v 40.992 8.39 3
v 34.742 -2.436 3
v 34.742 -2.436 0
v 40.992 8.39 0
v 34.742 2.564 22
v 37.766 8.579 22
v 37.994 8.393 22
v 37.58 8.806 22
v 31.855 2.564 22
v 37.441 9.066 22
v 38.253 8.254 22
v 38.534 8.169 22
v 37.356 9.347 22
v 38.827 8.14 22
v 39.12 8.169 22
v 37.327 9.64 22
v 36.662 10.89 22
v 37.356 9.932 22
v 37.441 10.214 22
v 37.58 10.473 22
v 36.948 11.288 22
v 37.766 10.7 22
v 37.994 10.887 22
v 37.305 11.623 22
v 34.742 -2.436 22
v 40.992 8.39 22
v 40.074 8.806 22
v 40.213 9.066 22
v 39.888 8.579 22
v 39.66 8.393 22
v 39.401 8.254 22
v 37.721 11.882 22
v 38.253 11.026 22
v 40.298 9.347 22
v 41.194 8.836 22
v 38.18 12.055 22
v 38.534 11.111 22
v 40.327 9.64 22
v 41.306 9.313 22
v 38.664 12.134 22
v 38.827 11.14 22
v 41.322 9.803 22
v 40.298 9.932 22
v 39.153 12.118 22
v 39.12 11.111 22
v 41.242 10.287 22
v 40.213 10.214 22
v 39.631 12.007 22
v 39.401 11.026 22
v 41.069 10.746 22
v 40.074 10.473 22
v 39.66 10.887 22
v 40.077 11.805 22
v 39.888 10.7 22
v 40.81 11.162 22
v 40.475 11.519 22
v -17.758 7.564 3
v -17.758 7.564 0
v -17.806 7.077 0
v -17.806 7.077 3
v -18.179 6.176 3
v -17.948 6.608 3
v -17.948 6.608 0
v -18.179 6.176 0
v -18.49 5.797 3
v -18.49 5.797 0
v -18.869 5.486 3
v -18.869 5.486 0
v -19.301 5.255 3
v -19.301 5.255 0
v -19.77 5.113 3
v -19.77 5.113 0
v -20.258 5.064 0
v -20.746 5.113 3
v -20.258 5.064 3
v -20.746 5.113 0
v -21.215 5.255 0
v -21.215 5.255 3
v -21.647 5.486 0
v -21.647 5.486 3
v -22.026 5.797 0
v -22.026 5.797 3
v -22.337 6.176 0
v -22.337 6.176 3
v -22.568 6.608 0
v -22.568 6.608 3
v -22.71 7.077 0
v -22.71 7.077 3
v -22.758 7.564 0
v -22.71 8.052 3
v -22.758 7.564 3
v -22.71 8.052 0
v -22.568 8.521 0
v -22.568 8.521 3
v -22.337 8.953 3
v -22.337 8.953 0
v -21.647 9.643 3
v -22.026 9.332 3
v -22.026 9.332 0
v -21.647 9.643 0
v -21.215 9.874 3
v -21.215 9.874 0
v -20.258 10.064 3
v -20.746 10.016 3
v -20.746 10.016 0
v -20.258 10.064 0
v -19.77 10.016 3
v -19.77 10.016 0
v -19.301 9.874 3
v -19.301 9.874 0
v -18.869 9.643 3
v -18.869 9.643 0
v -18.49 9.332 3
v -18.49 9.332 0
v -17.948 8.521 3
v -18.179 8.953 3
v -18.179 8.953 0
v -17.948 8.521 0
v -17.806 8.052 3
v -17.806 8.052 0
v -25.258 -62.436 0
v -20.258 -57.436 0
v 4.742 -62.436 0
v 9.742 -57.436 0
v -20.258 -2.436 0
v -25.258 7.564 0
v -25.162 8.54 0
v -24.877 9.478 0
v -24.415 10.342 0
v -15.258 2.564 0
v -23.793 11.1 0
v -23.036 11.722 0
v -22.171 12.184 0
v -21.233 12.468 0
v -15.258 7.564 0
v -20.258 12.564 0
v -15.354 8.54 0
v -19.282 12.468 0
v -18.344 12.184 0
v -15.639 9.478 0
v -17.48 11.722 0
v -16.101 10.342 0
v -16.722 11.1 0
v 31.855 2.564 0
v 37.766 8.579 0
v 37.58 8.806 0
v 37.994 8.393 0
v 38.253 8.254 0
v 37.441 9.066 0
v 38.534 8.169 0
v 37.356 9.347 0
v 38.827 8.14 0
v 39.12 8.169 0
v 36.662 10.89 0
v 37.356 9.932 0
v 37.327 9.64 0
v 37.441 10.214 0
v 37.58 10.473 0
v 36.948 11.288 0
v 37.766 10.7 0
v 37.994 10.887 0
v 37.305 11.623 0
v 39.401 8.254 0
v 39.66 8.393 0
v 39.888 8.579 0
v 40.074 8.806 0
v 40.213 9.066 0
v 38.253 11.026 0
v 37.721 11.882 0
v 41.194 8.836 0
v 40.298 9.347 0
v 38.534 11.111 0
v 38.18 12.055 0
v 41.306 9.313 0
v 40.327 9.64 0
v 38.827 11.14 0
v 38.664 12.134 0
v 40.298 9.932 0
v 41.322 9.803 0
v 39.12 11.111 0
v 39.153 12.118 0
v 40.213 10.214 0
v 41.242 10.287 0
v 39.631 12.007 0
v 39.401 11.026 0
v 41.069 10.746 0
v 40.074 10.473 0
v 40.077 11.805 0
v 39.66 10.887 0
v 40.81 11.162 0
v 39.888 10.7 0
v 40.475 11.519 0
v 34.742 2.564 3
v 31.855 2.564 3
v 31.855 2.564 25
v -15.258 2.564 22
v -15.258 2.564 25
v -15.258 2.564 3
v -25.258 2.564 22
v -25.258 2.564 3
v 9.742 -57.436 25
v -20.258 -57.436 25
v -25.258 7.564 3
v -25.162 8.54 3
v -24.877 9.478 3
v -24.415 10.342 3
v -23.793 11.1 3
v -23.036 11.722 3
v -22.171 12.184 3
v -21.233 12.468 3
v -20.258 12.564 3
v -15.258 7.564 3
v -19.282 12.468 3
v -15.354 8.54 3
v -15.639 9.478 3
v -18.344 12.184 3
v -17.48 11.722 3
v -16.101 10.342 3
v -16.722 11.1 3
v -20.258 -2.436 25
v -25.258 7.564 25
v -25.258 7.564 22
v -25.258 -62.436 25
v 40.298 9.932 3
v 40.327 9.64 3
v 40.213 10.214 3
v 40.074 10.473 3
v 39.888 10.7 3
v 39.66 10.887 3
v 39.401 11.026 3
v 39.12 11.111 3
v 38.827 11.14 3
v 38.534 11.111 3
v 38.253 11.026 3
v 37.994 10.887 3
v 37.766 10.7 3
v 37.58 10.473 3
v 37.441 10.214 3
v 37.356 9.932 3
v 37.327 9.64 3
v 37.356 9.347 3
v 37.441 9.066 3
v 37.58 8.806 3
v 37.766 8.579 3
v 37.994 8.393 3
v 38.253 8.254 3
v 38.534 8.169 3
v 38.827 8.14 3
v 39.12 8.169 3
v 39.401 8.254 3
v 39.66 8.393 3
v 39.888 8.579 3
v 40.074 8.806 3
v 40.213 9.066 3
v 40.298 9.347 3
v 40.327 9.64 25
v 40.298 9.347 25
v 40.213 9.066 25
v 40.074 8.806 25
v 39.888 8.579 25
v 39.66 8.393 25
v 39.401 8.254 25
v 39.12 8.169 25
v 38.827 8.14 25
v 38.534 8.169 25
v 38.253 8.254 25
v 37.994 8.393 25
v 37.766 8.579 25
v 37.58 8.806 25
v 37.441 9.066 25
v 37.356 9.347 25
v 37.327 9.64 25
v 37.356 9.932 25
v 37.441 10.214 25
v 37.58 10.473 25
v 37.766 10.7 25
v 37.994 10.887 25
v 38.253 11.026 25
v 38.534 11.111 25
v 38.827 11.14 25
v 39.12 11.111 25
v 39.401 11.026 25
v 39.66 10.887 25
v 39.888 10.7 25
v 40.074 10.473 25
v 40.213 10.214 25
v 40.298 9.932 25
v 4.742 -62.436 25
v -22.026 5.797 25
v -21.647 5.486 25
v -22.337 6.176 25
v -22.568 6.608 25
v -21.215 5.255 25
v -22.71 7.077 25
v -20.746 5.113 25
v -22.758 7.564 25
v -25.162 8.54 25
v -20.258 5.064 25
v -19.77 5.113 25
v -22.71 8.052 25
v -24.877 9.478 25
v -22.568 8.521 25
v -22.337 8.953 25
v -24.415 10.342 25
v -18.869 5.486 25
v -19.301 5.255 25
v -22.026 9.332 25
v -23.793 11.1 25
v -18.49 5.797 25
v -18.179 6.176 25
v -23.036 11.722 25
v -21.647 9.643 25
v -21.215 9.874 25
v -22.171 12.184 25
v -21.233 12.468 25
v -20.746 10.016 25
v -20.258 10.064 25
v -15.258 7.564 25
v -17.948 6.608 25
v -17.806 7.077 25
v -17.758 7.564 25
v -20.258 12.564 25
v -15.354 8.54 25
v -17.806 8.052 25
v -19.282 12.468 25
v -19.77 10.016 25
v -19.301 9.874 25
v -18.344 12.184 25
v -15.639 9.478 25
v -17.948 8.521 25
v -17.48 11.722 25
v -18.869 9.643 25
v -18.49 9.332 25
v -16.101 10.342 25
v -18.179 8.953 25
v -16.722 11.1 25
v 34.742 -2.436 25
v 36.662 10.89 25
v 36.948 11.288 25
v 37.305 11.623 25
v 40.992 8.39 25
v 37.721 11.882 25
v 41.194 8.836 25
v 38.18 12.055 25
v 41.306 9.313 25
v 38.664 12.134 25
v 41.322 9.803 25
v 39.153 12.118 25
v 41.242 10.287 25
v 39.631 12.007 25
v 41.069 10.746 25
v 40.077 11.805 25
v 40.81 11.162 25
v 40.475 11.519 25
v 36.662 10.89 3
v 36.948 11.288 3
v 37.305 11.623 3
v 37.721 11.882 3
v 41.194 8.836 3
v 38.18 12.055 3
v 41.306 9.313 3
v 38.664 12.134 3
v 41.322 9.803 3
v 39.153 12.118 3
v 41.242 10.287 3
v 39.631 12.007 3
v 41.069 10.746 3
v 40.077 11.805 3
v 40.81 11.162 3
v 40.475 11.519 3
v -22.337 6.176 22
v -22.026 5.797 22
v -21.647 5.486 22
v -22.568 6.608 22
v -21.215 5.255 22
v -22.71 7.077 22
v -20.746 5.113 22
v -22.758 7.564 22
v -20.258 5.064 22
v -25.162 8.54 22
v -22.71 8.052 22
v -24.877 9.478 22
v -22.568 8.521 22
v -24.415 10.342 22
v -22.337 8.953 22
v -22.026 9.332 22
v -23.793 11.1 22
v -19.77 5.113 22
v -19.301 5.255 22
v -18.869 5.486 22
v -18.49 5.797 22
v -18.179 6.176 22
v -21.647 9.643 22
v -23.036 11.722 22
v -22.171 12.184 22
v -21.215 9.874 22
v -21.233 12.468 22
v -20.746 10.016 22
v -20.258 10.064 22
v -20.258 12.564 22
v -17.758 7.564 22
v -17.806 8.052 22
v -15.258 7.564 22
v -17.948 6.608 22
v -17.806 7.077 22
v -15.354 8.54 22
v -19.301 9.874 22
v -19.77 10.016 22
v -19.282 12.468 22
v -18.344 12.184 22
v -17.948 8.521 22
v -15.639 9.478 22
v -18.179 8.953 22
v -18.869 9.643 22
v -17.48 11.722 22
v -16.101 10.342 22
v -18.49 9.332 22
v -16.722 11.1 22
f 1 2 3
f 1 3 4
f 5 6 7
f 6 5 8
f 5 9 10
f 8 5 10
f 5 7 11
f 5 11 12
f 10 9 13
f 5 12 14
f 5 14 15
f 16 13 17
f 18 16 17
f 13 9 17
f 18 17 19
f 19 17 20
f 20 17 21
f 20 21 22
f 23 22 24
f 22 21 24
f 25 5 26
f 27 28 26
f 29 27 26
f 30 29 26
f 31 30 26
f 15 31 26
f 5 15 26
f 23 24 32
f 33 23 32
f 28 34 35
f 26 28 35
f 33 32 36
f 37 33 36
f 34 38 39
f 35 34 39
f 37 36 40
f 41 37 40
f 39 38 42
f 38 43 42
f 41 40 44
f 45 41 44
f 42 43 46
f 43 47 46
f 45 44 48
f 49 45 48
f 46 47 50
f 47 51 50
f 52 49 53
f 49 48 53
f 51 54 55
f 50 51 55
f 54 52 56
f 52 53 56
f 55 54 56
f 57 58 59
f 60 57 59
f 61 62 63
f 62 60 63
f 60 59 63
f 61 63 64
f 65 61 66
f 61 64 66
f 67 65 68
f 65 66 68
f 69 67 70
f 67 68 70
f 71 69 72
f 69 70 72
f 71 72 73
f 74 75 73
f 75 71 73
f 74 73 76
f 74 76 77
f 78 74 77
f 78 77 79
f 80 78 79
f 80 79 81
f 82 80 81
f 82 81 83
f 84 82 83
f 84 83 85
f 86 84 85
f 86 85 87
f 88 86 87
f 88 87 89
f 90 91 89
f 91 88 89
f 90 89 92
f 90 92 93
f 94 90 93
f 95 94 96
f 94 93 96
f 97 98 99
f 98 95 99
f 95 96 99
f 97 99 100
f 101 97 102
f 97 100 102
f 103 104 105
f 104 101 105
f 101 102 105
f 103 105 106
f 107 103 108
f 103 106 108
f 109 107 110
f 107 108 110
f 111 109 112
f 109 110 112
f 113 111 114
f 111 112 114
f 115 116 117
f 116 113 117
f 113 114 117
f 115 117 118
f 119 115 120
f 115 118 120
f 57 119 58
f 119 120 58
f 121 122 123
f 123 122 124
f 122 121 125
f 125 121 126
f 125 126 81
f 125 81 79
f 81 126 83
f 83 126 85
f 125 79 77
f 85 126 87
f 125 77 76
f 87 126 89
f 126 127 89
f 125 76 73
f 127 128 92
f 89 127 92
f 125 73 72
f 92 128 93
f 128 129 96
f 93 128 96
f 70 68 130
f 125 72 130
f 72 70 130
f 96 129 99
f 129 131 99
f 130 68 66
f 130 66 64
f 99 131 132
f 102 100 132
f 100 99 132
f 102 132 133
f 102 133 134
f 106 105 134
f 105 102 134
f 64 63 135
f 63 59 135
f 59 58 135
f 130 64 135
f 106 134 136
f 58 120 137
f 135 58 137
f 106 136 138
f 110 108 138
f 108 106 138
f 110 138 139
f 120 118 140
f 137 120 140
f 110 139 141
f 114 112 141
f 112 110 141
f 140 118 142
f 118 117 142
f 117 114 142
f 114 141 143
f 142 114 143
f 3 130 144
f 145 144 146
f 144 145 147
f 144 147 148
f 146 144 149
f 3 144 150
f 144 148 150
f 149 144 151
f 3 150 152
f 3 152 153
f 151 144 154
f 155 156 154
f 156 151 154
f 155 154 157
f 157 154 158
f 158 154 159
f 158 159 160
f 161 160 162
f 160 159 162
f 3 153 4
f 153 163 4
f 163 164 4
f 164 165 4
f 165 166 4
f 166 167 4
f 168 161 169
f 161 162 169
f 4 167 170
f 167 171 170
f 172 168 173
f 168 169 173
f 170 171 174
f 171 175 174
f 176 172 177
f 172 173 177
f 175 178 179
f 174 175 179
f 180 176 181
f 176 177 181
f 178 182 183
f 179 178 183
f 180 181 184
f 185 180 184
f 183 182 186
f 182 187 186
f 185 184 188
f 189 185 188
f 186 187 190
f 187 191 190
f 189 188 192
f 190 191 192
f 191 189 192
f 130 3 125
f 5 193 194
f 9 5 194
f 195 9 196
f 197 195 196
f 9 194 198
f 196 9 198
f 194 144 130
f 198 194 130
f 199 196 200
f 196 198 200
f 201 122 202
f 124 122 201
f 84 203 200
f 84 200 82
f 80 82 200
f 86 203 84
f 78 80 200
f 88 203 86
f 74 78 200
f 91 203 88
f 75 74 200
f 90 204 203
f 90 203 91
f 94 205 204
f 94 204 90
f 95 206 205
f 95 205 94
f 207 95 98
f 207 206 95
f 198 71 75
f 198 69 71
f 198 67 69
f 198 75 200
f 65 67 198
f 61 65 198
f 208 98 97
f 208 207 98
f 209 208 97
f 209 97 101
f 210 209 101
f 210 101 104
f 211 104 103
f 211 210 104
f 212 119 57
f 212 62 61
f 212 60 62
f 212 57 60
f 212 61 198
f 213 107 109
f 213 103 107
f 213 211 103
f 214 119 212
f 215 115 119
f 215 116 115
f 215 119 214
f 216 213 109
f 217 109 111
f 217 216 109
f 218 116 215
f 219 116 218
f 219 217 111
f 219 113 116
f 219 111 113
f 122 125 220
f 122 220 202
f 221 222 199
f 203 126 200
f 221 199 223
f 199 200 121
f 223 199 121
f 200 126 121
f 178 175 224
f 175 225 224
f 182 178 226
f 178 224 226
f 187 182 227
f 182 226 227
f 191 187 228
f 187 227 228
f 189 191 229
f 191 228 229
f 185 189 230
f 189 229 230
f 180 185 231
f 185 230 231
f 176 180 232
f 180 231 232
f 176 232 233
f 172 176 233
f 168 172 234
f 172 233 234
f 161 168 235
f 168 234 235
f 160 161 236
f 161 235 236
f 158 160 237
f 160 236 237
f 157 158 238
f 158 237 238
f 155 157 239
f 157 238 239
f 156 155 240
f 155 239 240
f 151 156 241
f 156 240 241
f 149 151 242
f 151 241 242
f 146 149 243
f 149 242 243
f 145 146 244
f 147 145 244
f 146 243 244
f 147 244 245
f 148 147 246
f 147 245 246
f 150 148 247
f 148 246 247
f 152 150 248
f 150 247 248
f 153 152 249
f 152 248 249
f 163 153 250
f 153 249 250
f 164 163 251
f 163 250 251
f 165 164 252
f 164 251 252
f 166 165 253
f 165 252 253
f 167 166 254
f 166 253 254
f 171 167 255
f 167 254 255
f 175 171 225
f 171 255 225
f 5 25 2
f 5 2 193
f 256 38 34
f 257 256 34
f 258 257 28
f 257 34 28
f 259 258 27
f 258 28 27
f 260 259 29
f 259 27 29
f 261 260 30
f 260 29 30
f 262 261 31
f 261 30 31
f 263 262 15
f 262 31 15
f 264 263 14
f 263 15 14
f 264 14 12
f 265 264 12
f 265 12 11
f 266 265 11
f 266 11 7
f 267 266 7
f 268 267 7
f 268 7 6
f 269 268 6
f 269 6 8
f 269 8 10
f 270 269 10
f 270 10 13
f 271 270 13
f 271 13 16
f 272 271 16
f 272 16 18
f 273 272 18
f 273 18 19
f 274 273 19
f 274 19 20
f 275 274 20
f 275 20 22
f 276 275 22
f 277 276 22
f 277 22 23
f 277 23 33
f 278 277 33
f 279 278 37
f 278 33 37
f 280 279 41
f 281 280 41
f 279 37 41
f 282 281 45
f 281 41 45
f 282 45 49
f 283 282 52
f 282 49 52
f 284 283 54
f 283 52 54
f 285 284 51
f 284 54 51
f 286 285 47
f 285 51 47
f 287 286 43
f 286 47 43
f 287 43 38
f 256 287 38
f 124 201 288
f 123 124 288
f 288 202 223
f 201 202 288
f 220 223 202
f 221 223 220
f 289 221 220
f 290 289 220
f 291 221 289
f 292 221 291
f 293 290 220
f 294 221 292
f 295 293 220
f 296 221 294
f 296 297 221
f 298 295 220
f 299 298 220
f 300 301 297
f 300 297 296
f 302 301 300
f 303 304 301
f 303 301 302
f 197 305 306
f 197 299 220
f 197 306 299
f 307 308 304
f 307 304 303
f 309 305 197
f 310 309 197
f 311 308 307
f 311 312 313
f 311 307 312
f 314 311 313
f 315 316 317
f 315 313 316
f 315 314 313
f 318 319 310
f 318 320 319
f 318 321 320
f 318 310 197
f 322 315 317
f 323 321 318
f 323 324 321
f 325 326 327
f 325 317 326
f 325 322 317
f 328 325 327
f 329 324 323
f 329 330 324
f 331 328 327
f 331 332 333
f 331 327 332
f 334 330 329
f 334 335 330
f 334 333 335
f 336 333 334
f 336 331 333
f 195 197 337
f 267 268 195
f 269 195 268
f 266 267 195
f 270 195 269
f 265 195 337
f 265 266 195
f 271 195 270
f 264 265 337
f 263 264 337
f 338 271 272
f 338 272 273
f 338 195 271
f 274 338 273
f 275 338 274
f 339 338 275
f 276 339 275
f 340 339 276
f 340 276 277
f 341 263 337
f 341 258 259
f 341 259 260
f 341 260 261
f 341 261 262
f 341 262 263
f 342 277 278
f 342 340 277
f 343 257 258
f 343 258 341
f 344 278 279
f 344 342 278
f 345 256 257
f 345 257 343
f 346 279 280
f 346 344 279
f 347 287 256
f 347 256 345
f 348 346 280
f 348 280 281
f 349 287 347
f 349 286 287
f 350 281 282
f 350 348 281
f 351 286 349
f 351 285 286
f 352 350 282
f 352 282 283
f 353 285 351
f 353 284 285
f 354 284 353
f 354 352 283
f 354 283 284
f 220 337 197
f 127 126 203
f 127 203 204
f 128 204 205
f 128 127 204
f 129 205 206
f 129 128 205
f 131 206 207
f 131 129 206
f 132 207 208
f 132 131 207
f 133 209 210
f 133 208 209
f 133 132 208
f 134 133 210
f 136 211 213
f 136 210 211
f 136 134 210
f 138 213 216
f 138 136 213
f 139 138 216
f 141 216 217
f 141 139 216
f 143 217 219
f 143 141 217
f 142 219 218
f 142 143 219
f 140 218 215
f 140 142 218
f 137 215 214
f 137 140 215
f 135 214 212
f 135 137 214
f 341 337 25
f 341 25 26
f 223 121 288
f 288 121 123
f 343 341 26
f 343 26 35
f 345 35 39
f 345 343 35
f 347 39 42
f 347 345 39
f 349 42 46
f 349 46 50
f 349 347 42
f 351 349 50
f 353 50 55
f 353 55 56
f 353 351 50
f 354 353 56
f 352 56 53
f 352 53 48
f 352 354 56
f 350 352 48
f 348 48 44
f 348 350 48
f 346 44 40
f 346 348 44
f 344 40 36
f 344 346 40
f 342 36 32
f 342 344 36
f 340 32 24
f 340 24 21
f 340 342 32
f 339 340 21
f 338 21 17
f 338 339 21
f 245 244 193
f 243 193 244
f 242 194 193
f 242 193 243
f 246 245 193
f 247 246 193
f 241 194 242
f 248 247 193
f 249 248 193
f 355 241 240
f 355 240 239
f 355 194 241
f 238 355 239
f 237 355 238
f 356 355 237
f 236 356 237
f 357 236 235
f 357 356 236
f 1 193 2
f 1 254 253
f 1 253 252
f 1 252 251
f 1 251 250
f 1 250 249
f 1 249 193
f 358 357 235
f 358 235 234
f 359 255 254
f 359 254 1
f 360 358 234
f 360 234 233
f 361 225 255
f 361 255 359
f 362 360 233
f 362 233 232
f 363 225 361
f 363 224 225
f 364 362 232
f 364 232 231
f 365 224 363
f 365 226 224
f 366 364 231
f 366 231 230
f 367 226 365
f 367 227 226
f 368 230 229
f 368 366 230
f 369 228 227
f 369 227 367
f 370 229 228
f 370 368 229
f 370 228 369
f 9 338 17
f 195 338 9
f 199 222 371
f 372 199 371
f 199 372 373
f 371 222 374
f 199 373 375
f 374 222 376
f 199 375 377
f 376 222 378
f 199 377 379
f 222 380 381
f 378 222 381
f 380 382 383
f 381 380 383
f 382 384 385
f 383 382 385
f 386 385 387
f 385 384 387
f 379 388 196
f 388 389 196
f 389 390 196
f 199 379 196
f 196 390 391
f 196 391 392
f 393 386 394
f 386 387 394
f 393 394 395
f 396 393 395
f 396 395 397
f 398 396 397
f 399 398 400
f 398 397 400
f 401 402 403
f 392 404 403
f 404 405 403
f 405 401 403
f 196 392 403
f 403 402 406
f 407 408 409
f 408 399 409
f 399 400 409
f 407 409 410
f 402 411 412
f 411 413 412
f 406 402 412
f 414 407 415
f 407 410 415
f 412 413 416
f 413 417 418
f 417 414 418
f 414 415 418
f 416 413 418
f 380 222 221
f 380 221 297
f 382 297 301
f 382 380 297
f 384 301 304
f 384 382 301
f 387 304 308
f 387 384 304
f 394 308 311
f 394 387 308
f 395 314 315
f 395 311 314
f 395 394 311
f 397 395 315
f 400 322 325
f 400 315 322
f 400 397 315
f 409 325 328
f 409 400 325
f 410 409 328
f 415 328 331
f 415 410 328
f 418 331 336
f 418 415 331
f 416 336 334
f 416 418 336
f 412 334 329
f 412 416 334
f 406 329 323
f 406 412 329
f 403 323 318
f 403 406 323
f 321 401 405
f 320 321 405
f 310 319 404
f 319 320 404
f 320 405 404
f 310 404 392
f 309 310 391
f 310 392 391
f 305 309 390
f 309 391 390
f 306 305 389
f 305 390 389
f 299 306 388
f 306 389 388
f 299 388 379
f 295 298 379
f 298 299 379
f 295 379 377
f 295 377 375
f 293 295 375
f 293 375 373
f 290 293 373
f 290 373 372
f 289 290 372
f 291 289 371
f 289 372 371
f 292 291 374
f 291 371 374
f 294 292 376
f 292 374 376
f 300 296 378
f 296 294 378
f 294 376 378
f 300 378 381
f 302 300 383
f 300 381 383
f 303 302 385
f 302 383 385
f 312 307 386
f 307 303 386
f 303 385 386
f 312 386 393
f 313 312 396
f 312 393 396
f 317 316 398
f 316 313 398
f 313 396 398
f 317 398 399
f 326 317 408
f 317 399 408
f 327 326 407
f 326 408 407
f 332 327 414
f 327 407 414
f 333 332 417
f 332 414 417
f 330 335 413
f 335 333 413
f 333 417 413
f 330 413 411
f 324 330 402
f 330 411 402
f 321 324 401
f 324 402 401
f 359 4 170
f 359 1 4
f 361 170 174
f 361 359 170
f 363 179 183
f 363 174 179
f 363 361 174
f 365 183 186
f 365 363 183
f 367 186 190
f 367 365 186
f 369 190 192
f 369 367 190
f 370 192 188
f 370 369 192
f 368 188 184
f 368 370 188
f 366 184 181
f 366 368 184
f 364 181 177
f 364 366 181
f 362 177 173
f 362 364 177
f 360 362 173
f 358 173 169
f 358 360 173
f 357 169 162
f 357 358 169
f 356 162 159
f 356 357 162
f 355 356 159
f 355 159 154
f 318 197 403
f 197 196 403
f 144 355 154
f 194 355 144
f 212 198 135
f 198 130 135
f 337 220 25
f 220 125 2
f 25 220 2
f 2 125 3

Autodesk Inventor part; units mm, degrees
ref_plane "YZ Plane" through (0, 0, 0) normal (1, 0, 0) x (0, 1, 0)
ref_plane "XZ Plane" through (0, 0, 0) normal (0, 1, 0) x (-1, 0, 0)
ref_plane "XY Plane" through (0, 0, 0) normal (0, 0, 1) x (1, 0, 0)
sketch "Sketch1" plane through (0, 0, 0) normal (0, 0, 1) x (1, 0, 0)
  circle A0 centre (-20.2579, 7.5645) radius 2.5
  line L0 (34.7421, -2.4355) -> (34.7421, 2.5645)
  line L1 (34.7421, 2.5645) -> (-15.2579, 2.5645)
  line L2 (-15.2579, 2.5645) -> (-15.2579, 7.5645)
  arc A1 (-15.2579, 7.5645) -> (-25.2579, 7.5645) centre (-20.2579, 7.5645) ccw
  line L3 (-25.2579, 7.5645) -> (-25.2579, -62.4355)
  line L4 (-25.2579, -62.4355) -> (4.7421, -62.4355)
  line L5 (9.7421, -57.4355) -> (4.7421, -62.4355)
  line L6 (-20.2579, -57.4355) -> (9.7421, -57.4355)
  line L7 (-20.2579, -2.4355) -> (-20.2579, -57.4355)
  line L8 (-20.2579, -2.4355) -> (34.7421, -2.4355)
  line L9 (-15.2579, 2.5645) -> (-25.2579, 2.5645)
  point P0 (0, 0)
  point P1 (4.7421, 37.5645)
  dimension "d0" = 5
  dimension "d1" = 5
  dimension "d2" = 30
  dimension "d3" = 55
  dimension "d4" = 5
  dimension "d5" = 5
  dimension "d6" = 5
  dimension "d7" = 65
  dimension "d8" = 5
  dimension "d24" = 30
extrude "Extrusion1" add sketch "Sketch1" along normal blind 25
ref_plane "Work Plane1" through (0, 0, 12.5) normal (0, 0, 1) x (1, 0, 0)
sketch "Sketch2" plane through (0, 0, 12.5) normal (0, 0, 1) x (1, 0, 0)
  line L0 (-15.2579, 2.5645) -> (-15.2579, 7.5645) projected
  line L1 (34.7421, 2.5645) -> (-15.2579, 2.5645) projected
  line L2 (34.7421, -2.4355) -> (34.7421, 2.5645) projected
  line L3 (-20.2579, -2.4355) -> (34.7421, -2.4355) projected
  line L4 (-20.2579, -57.4355) -> (-20.2579, -2.4355) projected
  line L5 (9.7421, -57.4355) -> (-20.2579, -57.4355) projected
  line L6 (4.7421, -62.4355) -> (9.7421, -57.4355) projected
  line L7 (-25.2579, -62.4355) -> (4.7421, -62.4355) projected
  line L8 (-25.2579, 7.5645) -> (-25.2579, -62.4355) projected
  arc A0 (-15.2579, 7.5645) -> (-25.2579, 7.5645) centre (-20.2579, 7.5645) ccw projected
  circle A1 centre (-20.2579, 7.5645) radius 2.5 projected
  line L9 (-15.2579, 2.5645) -> (-15.2579, 7.5645) projected
  line L10 (-15.2579, 2.5645) -> (-25.2579, 2.5645)
  line L11 (-25.2579, 7.5645) -> (-25.2579, -62.4355) projected
  point P0 (0, 0)
extrude "Extrusion2" cut sketch "Sketch2" along normal mid plane 19 contours L10 L8 A0 L0
sketch "Sketch3" plane through (0, 0, 12.5) normal (0, 0, 1) x (1, 0, 0)
  line L0 (-20.2579, -2.4355) -> (34.7421, -2.4355) projected
  line L1 (34.7421, -2.4355) -> (42.2421, 10.5548)
  line L2 (34.7421, -2.4355) -> (34.7421, 2.5645) projected
  line L3 (34.7421, 2.5645) -> (40.0771, 11.8048)
  circle A0 centre (38.8271, 9.6398) radius 1.5
  line L4 (34.7421, 2.5645) -> (-15.2579, 2.5645) projected
  line L5 (42.2421, 10.5548) -> (40.0771, 11.8048)
  line L6 (40.0771, 11.8048) -> (37.912, 13.0548)
  line L7 (37.912, 13.0548) -> (31.8554, 2.5645)
  circle A1 centre (38.8271, 9.6398) radius 2.5
  point P0 (0, 0)
  point P1 (36.662, 10.8898)
  point P2 (40.9921, 8.3898)
  dimension "d13" = 15
  dimension "d14" = 30
  dimension "d15" = 3
  dimension "d16" = 2.5
  dimension "d17" = 60
  dimension "d18" = 2.5
  dimension "d19" = 2.5
extrude "Extrusion3" add sketch "Sketch3" along normal mid plane 25 contours L2 L3 A1 L1 | A1 L3 A0 | L4 L7 A1 L3 | A1 L3 A0
extrude "Extrusion4" cut sketch "Sketch3" along normal mid plane 19 contours L2 L3 A1 L1 | A1 L3 A0 | L4 L7 A1 L3 | A1 L3 A0
sketch "Sketch4" plane through (0, 0, 0) normal (0, 0, -1) x (-1, 0, 0)
  circle A0 centre (-38.8271, 9.6398) radius 1.5 projected
  line L0 (15.2579, 2.5645) -> (15.2579, 7.5645) projected
  line L1 (-31.8554, 2.5645) -> (15.2579, 2.5645) projected
  line L2 (-31.8554, 2.5645) -> (-36.662, 10.8898) projected
  arc A1 (-36.662, 10.8898) -> (-40.9921, 8.3898) centre (-38.8271, 9.6398) ccw projected
  line L3 (-40.9921, 8.3898) -> (-34.7421, -2.4355) projected
  line L4 (20.2579, -2.4355) -> (-34.7421, -2.4355) projected
  line L5 (20.2579, -57.4355) -> (20.2579, -2.4355) projected
  line L6 (-9.7421, -57.4355) -> (20.2579, -57.4355) projected
  line L7 (-4.7421, -62.4355) -> (-9.7421, -57.4355) projected
  line L8 (25.2579, -62.4355) -> (-4.7421, -62.4355) projected
  line L9 (25.2579, 7.5645) -> (25.2579, -62.4355) projected
  arc A2 (25.2579, 7.5645) -> (15.2579, 7.5645) centre (20.2579, 7.5645) ccw projected
  circle A3 centre (20.2579, 7.5645) radius 2.5 projected
  line L10 (20.2579, -2.4355) -> (-34.7421, -2.4355) projected
  line L11 (-31.8554, 2.5645) -> (-34.7421, 2.5645) projected
  line L12 (-34.7421, -2.4355) -> (-34.7421, 2.5645)
  line L13 (-34.7421, 2.5645) -> (-31.8554, 2.5645)
  line L14 (-31.8554, 2.5645) -> (25.2579, 2.5645)
  line L15 (25.2579, 7.5645) -> (25.2579, -62.4355) projected
  point P0 (0, 0)
properties part number "Claw New"
